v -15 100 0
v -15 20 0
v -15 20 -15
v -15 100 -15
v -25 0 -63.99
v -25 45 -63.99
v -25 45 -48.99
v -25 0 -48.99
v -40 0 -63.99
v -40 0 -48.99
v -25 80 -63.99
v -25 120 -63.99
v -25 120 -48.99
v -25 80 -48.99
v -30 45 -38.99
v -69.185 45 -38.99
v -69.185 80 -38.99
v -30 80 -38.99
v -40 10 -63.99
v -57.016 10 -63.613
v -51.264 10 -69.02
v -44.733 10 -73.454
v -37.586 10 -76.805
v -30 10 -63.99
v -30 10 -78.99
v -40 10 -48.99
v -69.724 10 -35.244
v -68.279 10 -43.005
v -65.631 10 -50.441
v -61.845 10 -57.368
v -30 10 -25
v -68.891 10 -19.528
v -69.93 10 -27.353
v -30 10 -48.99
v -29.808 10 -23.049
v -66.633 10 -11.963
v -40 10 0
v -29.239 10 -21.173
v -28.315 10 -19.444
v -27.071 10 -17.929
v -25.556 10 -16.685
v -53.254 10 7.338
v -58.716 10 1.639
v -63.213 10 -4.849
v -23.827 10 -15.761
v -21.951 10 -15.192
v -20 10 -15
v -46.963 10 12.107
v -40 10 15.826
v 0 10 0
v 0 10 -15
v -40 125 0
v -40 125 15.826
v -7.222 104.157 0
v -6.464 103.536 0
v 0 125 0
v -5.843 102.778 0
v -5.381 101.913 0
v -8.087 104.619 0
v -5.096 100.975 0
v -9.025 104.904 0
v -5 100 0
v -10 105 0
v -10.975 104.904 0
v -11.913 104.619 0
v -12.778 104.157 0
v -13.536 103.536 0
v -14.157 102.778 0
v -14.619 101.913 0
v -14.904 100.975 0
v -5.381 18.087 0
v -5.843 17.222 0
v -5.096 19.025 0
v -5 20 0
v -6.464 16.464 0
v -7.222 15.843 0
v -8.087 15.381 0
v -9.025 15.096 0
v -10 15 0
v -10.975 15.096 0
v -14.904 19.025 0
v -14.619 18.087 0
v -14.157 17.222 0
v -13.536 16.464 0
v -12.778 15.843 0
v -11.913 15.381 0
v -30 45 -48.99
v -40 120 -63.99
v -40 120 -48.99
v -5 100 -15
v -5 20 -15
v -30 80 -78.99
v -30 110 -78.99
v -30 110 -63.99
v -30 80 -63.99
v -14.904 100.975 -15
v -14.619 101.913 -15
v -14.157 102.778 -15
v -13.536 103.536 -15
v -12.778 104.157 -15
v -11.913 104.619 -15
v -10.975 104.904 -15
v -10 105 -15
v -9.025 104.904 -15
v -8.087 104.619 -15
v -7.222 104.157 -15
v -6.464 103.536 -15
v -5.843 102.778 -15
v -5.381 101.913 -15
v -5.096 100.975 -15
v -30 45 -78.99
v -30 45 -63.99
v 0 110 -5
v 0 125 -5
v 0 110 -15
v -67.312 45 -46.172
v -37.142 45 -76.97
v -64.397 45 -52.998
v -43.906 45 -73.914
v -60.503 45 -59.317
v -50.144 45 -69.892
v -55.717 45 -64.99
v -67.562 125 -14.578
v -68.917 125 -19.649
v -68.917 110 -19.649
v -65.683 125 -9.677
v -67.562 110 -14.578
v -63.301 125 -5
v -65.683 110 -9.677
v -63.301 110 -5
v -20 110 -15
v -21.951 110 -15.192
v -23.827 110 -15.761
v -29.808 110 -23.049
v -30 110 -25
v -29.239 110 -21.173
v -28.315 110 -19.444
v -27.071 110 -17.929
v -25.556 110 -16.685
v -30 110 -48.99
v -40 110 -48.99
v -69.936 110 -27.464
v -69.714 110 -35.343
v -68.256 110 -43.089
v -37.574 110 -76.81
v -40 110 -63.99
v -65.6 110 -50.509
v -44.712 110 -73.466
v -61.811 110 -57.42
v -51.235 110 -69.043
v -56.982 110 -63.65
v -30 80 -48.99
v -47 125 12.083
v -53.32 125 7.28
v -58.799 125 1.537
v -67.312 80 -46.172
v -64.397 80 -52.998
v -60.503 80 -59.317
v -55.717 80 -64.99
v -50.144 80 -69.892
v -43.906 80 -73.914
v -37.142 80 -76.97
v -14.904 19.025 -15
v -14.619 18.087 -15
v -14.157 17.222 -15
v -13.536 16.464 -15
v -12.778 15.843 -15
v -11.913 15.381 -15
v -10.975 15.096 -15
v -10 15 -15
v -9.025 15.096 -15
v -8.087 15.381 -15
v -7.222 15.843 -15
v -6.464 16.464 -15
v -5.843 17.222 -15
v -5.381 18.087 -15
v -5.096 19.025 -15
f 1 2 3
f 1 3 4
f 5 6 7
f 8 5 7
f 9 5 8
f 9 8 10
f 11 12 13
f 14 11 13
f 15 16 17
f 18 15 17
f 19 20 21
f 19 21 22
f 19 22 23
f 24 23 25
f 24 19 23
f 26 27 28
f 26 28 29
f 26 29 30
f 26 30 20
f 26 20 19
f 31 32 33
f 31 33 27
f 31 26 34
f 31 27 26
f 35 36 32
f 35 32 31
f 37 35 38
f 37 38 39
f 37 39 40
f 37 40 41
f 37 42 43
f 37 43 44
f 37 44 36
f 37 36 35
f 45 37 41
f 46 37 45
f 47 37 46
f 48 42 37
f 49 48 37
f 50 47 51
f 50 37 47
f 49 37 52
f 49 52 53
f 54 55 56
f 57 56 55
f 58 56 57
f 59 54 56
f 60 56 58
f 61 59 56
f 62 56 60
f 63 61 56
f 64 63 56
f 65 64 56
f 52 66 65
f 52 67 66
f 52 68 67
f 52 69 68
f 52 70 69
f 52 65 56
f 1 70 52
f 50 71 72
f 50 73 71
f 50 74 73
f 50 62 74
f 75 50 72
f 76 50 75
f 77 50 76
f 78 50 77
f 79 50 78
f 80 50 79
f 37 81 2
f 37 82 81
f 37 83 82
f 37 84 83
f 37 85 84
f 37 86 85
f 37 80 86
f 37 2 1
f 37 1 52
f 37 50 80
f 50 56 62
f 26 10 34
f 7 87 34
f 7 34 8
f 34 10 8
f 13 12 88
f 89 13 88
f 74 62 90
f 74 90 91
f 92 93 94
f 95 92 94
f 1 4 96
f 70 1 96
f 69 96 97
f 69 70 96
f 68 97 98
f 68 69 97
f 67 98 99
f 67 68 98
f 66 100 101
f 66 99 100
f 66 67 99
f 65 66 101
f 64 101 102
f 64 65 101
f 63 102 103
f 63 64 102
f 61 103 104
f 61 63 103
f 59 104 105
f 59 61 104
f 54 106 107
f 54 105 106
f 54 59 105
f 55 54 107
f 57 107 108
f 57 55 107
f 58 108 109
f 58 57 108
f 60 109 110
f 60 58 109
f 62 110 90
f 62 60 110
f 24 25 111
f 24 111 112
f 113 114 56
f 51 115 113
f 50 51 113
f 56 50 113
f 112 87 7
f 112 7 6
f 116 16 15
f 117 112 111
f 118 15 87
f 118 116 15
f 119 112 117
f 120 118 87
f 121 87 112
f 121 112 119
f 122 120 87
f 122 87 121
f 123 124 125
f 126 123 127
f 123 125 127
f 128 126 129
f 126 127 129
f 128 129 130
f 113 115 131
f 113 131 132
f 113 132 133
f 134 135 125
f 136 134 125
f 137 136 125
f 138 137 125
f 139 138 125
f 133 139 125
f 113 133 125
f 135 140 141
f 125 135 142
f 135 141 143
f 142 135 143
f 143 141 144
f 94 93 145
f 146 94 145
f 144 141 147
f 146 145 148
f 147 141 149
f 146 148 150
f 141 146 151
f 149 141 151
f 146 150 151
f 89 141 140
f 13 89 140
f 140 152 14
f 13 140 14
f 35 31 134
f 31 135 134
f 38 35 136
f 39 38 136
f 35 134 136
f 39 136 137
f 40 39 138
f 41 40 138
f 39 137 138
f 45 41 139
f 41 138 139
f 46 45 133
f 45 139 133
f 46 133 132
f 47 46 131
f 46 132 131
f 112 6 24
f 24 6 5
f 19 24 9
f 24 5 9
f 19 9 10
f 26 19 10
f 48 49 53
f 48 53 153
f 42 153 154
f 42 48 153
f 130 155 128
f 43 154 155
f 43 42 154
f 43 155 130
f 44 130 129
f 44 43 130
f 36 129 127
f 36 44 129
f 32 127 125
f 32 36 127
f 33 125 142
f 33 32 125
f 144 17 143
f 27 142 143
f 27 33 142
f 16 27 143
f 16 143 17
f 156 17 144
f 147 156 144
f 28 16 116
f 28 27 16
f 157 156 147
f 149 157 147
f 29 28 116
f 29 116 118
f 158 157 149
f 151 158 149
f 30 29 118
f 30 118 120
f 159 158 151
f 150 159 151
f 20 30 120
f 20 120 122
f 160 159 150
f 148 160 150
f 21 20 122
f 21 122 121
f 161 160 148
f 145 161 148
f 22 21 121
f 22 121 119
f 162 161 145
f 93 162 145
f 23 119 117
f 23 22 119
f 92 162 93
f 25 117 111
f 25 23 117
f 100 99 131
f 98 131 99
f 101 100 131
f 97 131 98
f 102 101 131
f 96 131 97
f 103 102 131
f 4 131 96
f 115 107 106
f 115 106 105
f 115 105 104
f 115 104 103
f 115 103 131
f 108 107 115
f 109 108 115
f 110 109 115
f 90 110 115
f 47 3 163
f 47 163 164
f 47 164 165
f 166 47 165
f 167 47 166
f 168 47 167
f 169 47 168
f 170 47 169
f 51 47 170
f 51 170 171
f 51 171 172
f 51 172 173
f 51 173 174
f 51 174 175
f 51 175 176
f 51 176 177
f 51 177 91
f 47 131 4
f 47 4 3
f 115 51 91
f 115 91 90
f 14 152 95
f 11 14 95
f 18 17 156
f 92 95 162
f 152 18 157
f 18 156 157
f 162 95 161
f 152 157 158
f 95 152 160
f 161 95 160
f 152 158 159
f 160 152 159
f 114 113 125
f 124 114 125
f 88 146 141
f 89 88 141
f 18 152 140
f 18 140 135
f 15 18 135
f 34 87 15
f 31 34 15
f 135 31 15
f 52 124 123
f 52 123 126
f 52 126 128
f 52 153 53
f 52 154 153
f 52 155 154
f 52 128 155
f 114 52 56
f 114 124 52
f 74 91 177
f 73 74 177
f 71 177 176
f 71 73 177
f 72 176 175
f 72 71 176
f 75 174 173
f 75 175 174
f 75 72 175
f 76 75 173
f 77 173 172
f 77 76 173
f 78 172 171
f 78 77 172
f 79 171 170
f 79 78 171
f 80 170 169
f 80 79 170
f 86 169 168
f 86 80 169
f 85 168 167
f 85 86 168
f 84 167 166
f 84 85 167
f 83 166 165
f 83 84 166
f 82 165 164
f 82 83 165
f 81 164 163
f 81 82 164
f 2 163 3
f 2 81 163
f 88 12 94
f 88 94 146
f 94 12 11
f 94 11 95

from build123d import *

# Parameters (mm, degrees)
BOSS_EXTRUDE1_DEPTH     = 125
CUT_EXTRUDE1_DEPTH      = 10
CUT_EXTRUDE2_START      = -5
CUT_EXTRUDE2_DEPTH      = 5
CUT_EXTRUDE3_START      = -10
CUT_EXTRUDE3_DEPTH      = 10
FILLET1_R               = 10
CUT_EXTRUDE5_DEPTH      = 154.180898585
CUT_EXTRUDE5_DEPTH_BACK = 154.180898585
SKETCH6_W               = 40
SKETCH6_H               = 35
BOSS_EXTRUDE2_DEPTH     = 15
CUT_EXTRUDE6_DEPTH      = 157.90664054
CUT_EXTRUDE6_DEPTH_BACK = 157.90664054
SKETCH8_R               = 5


with BuildPart() as part:
    # Sketch1 → Boss-Extrude1 (new body)
    with BuildSketch(Plane(origin=(0, 0, 0), x_dir=(1, 0, 0), z_dir=(0, 1, 0))):
        with BuildLine():
            Line((0, 0), (-40, 0))
            Line((-40, 0), (-40, -15.82575695))
            ThreePointArc((-40, -15.82575695), (-69.724211568, 35.244309675), (-30, 78.989794856))
            Line((-30, 78.989794856), (-30, 63.989794856))
            Line((-30, 63.989794856), (-25, 63.989794856))
            Line((-25, 63.989794856), (-25, 48.989794856))
            Line((-25, 48.989794856), (-30, 48.989794856))
            Line((-30, 48.989794856), (-30, 15))
            Line((-30, 15), (0, 15))
            Line((0, 15), (0, 0))
        make_face()
    extrude(amount=BOSS_EXTRUDE1_DEPTH)

    # Sketch2 → Cut-Extrude1 (cut)
    with BuildSketch(Plane.XZ):
        with BuildLine():
            Line((-30, -63.989794856), (-40, -63.989794856))
            Line((-40, -63.989794856), (-40, -48.989794856))
            Line((-40, -48.989794856), (-30, -48.989794856))
            Line((-30, -48.989794856), (-30, -15))
            Line((-30, -15), (0, -15))
            Line((0, -15), (0, 0))
            Line((0, 0), (-40, 0))
            Line((-40, 0), (-40, 15.82575695))
            ThreePointArc((-40, 15.82575695), (-69.724211568, -35.244309675), (-30, -78.989794856))
            Line((-30, -78.989794856), (-30, -63.989794856))
        make_face()
    extrude(amount=-CUT_EXTRUDE1_DEPTH, mode=Mode.SUBTRACT)

    # Sketch3 → Cut-Extrude2 (cut)
    with BuildSketch(Plane(origin=(0, 125, 0), x_dir=(1, 0, 0), z_dir=(0, 1, 0)).offset(CUT_EXTRUDE2_START)):
        with BuildLine():
            Line((0, 5), (-63.301270189, 5))
            ThreePointArc((-63.301270189, 5), (-65.594723232, 50.521238105), (-30, 78.989794856))
            Line((-30, 78.989794856), (-30, 63.989794856))
            Line((-30, 63.989794856), (-25, 63.989794856))
            Line((-25, 63.989794856), (-25, 48.989794856))
            Line((-25, 48.989794856), (-30, 48.989794856))
            Line((-30, 48.989794856), (-30, 15))
            Line((-30, 15), (0, 15))
            Line((0, 15), (0, 5))
        make_face()
    extrude(amount=CUT_EXTRUDE2_DEPTH, mode=Mode.SUBTRACT)

    # Sketch4 → Cut-Extrude3 (cut)
    with BuildSketch(Plane(origin=(0, 120, 0), x_dir=(1, 0, 0), z_dir=(0, 1, 0)).offset(CUT_EXTRUDE3_START)):
        with BuildLine():
            Line((-30, 63.989794856), (-40, 63.989794856))
            Line((-40, 63.989794856), (-40, 48.989794856))
            Line((-40, 48.989794856), (-30, 48.989794856))
            Line((-30, 48.989794856), (-30, 15))
            Line((-30, 15), (0, 15))
            Line((0, 15), (0, 5))
            Line((0, 5), (-63.301270189, 5))
            ThreePointArc((-63.301270189, 5), (-65.594723232, 50.521238105), (-30, 78.989794856))
            Line((-30, 78.989794856), (-30, 63.989794856))
        make_face()
    extrude(amount=CUT_EXTRUDE3_DEPTH, mode=Mode.SUBTRACT)

    # Fillet1
    fillet1_edges = [part.edges().sort_by_distance(p)[0] for p in [
        (-30, 60, -15),
    ]]
    fillet(fillet1_edges, radius=FILLET1_R)

    # Sketch6 → Cut-Extrude5 (cut, two sides: drawn at the far end of the back side and taken through both)
    with BuildSketch(Plane(origin=(-30, 0, 0), x_dir=(0, 0, -1), z_dir=(1, 0, 0)).offset(-CUT_EXTRUDE5_DEPTH_BACK)):
        with Locations((58.989794856, 62.5)):
            Rectangle(SKETCH6_W, SKETCH6_H)
    extrude(amount=CUT_EXTRUDE5_DEPTH + CUT_EXTRUDE5_DEPTH_BACK, mode=Mode.SUBTRACT)

    # Sketch7 → Boss-Extrude2 (add)
    with BuildSketch(Plane(origin=(0, 110, 0), x_dir=(1, 0, 0), z_dir=(0, 1, 0))):
        with BuildLine():
            Line((0, 5), (-68.916774738, 19.64871268))
            ThreePointArc((-68.916774738, 19.64871268), (-66.687130436, 12.102741784), (-63.301270189, 5))
            Line((-63.301270189, 5), (0, 5))
        make_face()
    extrude(amount=BOSS_EXTRUDE2_DEPTH)

    # Sketch8 → Cut-Extrude6 (cut, two sides: drawn at the far end of the back side and taken through both)
    with BuildSketch(Plane(origin=(0, 0, -15), x_dir=(-1, 0, 0), z_dir=(0, 0, -1)).offset(-CUT_EXTRUDE6_DEPTH_BACK)):
        with BuildLine():
            Line((15, 20), (15, 100))
            ThreePointArc((15, 100), (10, 95), (5, 100))
            Line((5, 100), (5, 20))
            ThreePointArc((5, 20), (10, 25), (15, 20))
        make_face()
        with Locations((10, 100)):
            Circle(SKETCH8_R)
        with Locations((10, 20)):
            Circle(SKETCH8_R)
    extrude(amount=CUT_EXTRUDE6_DEPTH + CUT_EXTRUDE6_DEPTH_BACK, mode=Mode.SUBTRACT)


solid = part.part
